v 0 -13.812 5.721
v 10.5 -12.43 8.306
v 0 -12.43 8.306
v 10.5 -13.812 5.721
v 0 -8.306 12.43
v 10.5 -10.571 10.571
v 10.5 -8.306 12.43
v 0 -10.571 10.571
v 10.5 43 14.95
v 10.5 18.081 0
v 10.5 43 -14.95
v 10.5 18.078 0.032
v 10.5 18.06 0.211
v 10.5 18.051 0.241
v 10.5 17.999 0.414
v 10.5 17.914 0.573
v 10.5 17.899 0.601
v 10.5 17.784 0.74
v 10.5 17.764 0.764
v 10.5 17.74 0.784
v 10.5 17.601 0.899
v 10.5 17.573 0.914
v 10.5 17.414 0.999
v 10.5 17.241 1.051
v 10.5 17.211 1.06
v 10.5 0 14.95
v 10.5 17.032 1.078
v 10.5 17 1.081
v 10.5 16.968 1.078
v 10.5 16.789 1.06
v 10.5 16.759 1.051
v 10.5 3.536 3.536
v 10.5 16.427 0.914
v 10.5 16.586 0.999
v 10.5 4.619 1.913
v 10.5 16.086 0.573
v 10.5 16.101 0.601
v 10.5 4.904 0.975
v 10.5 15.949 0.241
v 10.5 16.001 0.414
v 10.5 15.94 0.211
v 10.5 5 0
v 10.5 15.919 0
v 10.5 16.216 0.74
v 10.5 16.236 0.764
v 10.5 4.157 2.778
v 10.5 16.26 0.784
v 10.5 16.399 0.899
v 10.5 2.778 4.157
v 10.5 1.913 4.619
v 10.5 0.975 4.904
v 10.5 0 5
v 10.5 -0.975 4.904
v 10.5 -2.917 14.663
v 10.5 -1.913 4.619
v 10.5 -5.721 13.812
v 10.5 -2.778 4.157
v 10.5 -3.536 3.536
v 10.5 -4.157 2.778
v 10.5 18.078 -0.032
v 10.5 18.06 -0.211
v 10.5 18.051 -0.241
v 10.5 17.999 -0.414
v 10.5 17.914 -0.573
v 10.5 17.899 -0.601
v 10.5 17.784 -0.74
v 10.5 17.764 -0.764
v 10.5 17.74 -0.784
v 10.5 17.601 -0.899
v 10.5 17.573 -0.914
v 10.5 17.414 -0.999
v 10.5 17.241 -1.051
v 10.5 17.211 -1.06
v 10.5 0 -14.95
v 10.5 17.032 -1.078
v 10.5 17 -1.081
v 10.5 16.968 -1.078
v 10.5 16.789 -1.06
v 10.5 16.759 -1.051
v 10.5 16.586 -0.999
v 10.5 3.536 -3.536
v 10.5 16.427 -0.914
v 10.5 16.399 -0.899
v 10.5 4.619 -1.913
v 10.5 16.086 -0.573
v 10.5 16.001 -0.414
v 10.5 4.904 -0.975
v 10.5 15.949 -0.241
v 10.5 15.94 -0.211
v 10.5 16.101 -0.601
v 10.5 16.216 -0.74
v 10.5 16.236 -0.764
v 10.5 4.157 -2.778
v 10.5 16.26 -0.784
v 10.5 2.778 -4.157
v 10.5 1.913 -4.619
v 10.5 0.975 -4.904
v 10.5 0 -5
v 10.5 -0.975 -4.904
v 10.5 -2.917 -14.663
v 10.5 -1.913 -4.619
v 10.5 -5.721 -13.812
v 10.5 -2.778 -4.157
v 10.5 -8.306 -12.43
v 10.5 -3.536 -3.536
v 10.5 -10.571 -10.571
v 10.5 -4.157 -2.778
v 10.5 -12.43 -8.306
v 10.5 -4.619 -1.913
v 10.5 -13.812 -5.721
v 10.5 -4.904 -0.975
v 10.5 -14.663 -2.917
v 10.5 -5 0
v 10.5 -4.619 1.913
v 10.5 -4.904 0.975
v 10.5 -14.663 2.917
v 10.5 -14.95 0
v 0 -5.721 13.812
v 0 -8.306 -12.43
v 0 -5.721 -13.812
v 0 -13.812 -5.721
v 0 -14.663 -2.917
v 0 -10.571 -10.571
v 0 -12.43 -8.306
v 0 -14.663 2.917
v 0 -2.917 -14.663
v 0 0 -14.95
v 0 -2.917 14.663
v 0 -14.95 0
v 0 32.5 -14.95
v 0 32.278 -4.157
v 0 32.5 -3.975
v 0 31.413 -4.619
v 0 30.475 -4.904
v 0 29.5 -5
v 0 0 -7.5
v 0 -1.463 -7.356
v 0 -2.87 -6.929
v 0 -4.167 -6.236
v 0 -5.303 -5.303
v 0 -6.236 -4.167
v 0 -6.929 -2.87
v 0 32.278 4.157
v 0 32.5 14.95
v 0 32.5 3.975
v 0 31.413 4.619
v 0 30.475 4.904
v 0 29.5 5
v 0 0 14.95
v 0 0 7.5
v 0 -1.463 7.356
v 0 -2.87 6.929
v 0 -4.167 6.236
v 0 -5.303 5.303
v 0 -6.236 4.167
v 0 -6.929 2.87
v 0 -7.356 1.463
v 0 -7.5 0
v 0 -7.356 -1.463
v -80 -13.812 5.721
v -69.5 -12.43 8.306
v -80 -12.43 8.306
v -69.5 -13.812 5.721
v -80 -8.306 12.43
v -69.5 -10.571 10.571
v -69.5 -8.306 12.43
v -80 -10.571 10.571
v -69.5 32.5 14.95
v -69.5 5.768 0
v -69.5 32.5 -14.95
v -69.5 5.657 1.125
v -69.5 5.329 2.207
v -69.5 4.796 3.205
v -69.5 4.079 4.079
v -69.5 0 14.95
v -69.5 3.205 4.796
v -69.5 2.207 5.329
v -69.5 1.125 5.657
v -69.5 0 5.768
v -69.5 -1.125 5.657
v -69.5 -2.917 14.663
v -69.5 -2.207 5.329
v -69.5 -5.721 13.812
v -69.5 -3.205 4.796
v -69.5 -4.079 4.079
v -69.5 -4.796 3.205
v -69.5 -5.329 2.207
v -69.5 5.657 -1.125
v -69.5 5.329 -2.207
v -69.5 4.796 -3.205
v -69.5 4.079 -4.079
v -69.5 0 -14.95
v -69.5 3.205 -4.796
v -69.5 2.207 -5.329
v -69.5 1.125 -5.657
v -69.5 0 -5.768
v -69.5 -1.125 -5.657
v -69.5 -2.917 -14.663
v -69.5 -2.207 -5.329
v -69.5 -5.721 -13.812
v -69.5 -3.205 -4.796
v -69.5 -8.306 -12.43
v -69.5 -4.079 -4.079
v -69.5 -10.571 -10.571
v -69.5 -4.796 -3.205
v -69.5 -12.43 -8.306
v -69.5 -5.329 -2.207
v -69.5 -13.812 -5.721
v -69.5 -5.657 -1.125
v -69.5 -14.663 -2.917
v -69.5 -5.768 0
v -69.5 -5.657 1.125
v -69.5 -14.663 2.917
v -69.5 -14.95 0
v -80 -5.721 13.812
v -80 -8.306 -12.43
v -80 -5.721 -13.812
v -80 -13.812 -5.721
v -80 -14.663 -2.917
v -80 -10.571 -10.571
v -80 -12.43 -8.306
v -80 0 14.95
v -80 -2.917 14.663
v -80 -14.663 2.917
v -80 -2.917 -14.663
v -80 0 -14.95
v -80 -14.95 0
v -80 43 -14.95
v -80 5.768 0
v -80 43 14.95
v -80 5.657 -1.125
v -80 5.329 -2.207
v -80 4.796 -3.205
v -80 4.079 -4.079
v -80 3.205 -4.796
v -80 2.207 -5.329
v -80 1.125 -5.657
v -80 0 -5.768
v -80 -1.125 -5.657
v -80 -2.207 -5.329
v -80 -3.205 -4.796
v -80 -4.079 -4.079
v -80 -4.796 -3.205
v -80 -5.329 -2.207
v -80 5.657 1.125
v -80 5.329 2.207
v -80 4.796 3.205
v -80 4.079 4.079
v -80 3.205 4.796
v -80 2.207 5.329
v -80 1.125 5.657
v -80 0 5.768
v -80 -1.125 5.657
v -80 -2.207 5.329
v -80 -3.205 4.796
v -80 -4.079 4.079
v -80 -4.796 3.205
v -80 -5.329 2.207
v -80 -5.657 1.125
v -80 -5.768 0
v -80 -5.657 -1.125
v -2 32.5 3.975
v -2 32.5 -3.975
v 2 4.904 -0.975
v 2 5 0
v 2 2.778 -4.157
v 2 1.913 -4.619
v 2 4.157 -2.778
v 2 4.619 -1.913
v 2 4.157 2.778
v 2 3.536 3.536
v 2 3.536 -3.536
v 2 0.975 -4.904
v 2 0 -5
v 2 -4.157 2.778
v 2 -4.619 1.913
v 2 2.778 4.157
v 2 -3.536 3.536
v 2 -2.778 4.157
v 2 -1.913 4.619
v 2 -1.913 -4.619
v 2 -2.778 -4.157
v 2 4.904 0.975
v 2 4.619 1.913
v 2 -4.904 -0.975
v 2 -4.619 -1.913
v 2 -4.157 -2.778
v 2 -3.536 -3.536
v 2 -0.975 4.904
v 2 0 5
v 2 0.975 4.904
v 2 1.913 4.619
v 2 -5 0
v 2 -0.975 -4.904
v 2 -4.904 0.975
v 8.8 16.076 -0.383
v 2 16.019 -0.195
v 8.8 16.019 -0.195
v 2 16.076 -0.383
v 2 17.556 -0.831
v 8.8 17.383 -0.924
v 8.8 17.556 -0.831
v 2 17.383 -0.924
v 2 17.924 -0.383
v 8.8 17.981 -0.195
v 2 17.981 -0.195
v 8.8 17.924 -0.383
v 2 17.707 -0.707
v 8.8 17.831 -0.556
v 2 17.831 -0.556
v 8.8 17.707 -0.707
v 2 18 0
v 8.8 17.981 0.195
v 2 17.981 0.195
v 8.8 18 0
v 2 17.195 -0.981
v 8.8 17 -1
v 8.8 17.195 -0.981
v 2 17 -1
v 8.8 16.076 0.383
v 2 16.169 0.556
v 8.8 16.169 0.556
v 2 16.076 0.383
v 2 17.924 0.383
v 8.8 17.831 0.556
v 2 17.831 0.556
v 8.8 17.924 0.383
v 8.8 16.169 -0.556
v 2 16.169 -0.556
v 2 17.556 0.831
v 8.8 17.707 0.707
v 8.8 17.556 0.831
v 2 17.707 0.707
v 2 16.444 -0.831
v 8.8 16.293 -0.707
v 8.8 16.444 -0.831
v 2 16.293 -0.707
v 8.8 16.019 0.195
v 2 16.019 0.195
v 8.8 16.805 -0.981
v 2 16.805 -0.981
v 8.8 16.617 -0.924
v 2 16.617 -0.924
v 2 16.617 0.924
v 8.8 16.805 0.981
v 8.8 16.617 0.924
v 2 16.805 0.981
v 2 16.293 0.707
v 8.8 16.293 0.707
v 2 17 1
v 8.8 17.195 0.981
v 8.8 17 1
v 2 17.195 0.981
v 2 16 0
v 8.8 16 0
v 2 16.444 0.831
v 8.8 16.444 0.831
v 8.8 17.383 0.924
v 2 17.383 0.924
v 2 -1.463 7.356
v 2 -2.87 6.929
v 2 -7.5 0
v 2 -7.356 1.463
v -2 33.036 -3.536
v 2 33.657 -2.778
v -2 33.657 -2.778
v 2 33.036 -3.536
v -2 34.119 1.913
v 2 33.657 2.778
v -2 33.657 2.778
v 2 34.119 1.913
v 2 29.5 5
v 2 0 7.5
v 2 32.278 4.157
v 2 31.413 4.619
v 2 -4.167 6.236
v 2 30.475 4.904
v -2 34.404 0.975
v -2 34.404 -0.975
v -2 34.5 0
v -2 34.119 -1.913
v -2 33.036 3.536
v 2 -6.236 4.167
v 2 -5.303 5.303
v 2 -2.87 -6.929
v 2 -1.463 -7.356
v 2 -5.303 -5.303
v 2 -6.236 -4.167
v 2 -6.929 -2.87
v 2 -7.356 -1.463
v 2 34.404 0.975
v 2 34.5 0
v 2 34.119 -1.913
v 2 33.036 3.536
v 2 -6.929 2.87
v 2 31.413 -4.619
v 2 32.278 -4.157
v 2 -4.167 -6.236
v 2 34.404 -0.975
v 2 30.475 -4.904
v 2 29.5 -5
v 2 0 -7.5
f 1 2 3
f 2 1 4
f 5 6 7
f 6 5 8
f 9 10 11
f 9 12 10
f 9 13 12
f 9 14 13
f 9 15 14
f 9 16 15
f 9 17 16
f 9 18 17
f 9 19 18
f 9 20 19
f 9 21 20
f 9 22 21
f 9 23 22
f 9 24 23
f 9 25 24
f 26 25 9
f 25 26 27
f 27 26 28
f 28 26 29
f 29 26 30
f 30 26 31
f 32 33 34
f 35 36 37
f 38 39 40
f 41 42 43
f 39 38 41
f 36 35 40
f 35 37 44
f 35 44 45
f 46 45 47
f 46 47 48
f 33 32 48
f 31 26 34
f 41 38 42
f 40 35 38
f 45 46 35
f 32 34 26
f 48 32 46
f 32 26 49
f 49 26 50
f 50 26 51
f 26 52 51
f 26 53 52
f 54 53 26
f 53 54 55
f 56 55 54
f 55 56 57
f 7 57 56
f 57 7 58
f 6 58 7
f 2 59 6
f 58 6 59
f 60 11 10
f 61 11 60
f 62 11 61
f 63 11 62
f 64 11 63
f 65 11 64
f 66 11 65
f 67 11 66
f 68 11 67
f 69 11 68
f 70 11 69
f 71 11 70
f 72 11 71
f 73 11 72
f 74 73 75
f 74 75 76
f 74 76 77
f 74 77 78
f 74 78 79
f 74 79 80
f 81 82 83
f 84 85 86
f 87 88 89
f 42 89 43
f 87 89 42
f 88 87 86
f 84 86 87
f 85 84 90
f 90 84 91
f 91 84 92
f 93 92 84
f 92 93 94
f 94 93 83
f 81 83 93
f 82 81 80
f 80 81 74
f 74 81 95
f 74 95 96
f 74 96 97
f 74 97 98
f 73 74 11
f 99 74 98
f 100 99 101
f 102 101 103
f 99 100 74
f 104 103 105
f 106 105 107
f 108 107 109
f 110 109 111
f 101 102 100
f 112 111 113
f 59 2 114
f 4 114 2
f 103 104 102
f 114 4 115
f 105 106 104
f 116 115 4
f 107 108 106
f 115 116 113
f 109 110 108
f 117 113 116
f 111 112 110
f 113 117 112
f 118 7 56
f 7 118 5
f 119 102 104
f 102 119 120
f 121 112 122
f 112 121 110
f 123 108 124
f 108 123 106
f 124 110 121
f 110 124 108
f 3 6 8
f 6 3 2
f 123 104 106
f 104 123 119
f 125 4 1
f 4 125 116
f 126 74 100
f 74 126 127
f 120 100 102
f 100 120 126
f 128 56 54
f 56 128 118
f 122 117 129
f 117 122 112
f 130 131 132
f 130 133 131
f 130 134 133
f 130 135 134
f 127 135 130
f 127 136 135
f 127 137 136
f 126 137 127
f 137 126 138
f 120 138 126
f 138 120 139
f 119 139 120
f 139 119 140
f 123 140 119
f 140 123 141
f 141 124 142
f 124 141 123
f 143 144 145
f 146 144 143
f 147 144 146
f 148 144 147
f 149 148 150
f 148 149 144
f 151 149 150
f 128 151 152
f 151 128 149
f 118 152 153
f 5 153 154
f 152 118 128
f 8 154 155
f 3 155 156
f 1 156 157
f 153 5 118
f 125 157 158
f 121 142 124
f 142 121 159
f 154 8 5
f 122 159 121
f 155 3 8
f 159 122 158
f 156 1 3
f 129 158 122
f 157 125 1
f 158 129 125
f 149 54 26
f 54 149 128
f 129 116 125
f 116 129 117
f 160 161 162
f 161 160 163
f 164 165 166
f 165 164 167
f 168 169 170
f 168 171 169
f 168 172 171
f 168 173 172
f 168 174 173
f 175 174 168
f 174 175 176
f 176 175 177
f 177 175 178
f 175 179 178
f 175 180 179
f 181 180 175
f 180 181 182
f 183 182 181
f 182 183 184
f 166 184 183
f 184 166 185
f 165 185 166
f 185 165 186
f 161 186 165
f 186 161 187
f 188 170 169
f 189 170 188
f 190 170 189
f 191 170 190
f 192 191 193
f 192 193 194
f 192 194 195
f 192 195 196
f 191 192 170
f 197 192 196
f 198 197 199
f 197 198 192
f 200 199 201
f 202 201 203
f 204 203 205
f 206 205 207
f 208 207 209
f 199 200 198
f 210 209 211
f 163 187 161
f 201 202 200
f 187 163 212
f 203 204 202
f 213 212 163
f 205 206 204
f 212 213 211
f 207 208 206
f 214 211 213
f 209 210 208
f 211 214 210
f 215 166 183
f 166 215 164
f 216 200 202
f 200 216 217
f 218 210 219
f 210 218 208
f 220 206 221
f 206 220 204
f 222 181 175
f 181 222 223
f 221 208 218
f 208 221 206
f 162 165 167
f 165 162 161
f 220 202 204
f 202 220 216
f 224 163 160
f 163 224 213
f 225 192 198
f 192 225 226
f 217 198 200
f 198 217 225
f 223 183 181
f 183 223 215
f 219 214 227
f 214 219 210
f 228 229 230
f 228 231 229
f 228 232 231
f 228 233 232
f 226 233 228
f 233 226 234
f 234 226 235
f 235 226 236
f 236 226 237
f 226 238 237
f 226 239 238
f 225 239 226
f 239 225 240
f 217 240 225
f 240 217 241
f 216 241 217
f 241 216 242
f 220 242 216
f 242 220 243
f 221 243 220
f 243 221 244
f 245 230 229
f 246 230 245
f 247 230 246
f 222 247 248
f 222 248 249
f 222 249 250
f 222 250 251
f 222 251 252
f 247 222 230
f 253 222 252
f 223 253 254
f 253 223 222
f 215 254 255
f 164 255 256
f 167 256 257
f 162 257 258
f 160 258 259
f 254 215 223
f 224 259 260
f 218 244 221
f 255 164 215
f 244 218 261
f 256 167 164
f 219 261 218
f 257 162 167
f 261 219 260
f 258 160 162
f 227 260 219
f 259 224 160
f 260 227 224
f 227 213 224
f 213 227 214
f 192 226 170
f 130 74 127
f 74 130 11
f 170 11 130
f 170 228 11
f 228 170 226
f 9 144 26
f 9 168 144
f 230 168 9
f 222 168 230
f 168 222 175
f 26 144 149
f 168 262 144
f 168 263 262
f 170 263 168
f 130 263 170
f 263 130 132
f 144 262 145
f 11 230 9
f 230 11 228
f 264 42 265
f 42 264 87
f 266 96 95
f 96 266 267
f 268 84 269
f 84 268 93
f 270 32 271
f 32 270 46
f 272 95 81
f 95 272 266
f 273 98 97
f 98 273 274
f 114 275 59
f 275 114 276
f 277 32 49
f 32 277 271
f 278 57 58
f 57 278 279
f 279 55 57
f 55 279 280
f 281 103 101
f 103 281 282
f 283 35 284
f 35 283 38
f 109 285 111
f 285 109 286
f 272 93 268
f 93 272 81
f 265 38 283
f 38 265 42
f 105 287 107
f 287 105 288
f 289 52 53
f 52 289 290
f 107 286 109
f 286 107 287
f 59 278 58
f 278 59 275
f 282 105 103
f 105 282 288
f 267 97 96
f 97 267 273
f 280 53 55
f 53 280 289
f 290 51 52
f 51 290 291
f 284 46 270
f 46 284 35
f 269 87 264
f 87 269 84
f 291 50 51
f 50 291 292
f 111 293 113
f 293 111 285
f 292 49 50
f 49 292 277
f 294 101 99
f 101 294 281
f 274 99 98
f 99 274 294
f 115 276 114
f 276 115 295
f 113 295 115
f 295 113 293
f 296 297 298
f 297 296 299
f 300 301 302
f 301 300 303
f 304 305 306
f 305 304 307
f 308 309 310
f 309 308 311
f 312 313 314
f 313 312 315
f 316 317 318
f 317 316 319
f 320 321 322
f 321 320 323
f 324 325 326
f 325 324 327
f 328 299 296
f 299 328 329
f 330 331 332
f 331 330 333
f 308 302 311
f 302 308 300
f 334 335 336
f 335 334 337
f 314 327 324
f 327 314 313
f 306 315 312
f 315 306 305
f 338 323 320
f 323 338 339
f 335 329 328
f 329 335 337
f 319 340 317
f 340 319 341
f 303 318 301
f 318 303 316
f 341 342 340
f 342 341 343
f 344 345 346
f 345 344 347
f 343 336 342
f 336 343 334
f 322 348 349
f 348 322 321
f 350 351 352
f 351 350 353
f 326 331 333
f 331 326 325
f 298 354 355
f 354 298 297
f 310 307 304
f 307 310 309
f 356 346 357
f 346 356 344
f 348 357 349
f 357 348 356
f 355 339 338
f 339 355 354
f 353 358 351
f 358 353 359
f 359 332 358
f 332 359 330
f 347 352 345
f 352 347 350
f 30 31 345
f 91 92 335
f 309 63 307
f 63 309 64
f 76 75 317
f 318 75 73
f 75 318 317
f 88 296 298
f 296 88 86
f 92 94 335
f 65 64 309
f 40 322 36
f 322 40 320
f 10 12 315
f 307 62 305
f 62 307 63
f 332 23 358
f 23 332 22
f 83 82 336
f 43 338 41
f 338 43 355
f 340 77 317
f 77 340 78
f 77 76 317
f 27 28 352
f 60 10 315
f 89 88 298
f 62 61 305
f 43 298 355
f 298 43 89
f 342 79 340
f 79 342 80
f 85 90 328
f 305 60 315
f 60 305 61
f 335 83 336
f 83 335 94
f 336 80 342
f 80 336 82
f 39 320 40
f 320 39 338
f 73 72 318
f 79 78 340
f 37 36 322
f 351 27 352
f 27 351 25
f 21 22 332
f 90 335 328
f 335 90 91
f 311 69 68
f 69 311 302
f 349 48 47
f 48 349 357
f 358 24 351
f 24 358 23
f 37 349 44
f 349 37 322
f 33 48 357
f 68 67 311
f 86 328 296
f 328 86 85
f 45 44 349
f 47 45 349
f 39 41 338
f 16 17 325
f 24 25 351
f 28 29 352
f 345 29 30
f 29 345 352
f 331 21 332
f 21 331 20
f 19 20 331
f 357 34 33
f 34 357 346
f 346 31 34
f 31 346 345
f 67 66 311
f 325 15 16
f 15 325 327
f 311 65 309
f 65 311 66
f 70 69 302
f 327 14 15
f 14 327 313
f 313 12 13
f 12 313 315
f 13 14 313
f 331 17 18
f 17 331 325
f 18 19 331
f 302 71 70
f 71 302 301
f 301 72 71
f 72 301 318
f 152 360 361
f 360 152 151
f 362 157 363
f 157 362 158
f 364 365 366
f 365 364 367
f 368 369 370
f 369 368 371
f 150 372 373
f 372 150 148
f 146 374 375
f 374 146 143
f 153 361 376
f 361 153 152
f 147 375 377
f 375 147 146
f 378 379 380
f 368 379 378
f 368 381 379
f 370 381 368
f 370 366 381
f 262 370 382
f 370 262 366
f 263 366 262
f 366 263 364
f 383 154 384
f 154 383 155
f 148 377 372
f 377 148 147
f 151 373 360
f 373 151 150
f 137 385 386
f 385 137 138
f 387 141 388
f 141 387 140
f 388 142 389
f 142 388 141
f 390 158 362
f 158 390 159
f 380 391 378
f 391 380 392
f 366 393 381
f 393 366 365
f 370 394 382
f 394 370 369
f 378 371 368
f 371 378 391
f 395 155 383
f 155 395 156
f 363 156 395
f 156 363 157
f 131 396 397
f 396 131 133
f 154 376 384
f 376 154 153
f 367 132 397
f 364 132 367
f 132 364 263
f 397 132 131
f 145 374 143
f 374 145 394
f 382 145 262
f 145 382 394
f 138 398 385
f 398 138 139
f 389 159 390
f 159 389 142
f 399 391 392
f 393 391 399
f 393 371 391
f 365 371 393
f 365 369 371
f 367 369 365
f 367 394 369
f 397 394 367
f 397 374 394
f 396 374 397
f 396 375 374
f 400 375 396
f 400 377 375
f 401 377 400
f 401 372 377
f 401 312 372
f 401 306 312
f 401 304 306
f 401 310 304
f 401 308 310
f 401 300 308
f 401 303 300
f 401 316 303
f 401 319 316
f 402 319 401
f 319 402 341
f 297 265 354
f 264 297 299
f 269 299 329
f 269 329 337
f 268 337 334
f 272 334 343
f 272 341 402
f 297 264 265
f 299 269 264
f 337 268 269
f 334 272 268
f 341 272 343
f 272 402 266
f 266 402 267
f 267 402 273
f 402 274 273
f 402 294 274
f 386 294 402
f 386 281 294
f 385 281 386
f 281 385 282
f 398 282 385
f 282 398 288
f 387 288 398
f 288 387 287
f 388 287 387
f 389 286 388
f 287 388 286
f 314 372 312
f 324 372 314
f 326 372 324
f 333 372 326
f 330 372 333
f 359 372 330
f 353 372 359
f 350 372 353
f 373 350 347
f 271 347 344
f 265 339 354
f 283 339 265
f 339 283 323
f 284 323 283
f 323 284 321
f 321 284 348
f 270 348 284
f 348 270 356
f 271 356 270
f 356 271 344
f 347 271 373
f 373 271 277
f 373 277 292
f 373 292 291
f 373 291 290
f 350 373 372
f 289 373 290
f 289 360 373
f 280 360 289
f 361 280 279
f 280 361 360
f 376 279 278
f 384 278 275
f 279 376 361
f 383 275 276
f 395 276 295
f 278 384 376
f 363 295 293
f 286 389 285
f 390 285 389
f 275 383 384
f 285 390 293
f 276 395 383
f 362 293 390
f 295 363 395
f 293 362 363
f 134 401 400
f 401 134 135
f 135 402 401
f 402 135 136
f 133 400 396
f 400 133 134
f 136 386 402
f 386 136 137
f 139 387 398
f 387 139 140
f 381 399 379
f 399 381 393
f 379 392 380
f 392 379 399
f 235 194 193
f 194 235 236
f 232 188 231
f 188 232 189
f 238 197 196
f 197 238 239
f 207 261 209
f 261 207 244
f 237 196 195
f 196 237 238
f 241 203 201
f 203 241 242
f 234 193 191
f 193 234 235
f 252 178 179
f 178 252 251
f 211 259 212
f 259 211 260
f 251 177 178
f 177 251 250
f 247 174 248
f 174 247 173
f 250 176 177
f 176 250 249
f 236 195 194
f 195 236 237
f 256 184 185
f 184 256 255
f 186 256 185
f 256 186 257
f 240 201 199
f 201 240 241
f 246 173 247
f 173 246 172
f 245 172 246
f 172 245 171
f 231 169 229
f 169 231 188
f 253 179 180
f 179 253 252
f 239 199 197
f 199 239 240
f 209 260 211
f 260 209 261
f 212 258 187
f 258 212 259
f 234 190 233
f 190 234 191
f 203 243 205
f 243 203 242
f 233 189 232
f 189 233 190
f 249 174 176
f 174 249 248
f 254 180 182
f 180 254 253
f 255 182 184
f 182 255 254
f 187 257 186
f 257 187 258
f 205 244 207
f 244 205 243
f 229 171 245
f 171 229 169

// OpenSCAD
/* ------ s8330m ------ */
//servo dimensions
s8330m_width = 29; //D
s8330m_height = 39;
s8330m_length = 59;
s8330m_total_length = 74;
s8330m_total_height = 57;
s8330m_bottom_cylinder_diameter = 0.384*s8330m_width; //sleeve
//s8330m_bottom_cylinder_height = 4.8; //sleeve
s8830m_bottomhinge_hole = s8330m_bottom_cylinder_diameter+0.4;

//servo_fixation_holes
s8330m_fixation_hole_x = 5;
s8330m_fixation_hole_y = 0;
s8330m_fixation_hole_z = 8.25;
s8330m_hole_diameter = 2.5;

//horn
s8330m_horn_height = 4;
s8330m_horn_1stcircle = 10;
s8330m_horn_2ndcircle = 15;
s8330m_horn_length = 34.5;
s8330m_horn_bigscrew = 10;
s8330m_horn_smallscrew = 2;
s8330m_horn_smallscrew_length =17;
s8330m_horn_head_d1 = 2;
s8330m_horn_head_d2 = 4;
    
/* ----------------------------- */

/* ------ if base_servo == "s8330m" ------*/
//hinge
support_z_hinge = s8330m_width + 0.9;
support_width_hinge = (s8330m_total_length - s8330m_length)/2 + 3;
servo_axis_clear = (s8330m_horn_length -s8330m_horn_1stcircle/2 + 3);
servo_HTot = s8330m_total_height + 2; //A
bigscrew = s8330m_horn_bigscrew;
smallscrew = s8330m_horn_smallscrew;
smallscrew_length = s8330m_horn_smallscrew_length;
smallscrew_head_d1 = s8330m_horn_head_d1;
smallscrew_head_d2 = s8330m_horn_head_d2;
//sleeve
support_width_sleeve = (s8330m_total_length - s8330m_length)/2 + 3;
servo_L = s8330m_length + 0.9;
servo_H = s8330m_height + 0.5;
support_z_sleeve = s8330m_width + 0.9;
servo_bottom_cylinder_diameter = s8330m_bottom_cylinder_diameter;
//servo_fixation_holes
servo_fixation_hole_x = s8330m_fixation_hole_x ;
servo_fixation_hole_y = s8330m_fixation_hole_y ;
servo_fixation_hole_z = s8330m_fixation_hole_z ;
servo_hole_diameter = 2;

/* ----------------------------- */
sleeve_hinge_dist = (support_width_hinge+support_width_sleeve);
sleeve_hinge_size = sleeve_hinge_dist*2;
hinge_sleeve_dist = 5;
hanger_height = support_width_hinge + 0.3;

module servo_sleeve(type = "side_hole", hole = "one", base_servo = "s8330m"){
 
    union(){
	  difference(){
	    linear_extrude(height = support_z_sleeve, center = true)
	    polygon( points=[[0,0],
	                 [support_width_sleeve, 0],
	                 [support_width_sleeve, -(servo_H + support_width_sleeve)],
	                 [-servo_L - support_width_sleeve, -(servo_H + support_width_sleeve)],
	                 [-servo_L - support_width_sleeve, 0],
	                 [-servo_L, 0],
	                 [-servo_L, -servo_H],
	                 [0, -servo_H]
	                ]);
	    // Servo fixation hole
	    translate([servo_fixation_hole_x, servo_fixation_hole_y, servo_fixation_hole_z])
	    rotate([90, 0, 0])
	    cylinder(d = servo_hole_diameter, h = 15, $fn = 32);
	
	    // Servo fixation hole
	    translate([-servo_L - servo_fixation_hole_x, servo_fixation_hole_y, servo_fixation_hole_z])
	    rotate([90, 0, 0])
	    cylinder(d = servo_hole_diameter, h = 15, $fn = 32);
        if(hole == "two")
        {
            // Servo fixation hole
	    translate([servo_fixation_hole_x, servo_fixation_hole_y, -servo_fixation_hole_z])
	    rotate([90, 0, 0])
	    cylinder(d = servo_hole_diameter, h = 15, $fn = 32);
	
	    // Servo fixation hole
	    translate([-servo_L - servo_fixation_hole_x, servo_fixation_hole_y, -servo_fixation_hole_z])
	    rotate([90, 0, 0])
	    cylinder(d = servo_hole_diameter, h = 15, $fn = 32);
        }
        
        // Servo cable carving (side start)
	    translate([-servo_L - 1.4, -servo_H - 1.4 + 1e-3, -4.2/2])
	    #cube([support_width_sleeve, 7 + 1.4, 4.2]);
	
        if(type == "side_hole"){
  	      // Servo cable carving
	      translate([-servo_L, -1.4 - servo_H, -4.2/2])
	      cube([servo_L + support_width_sleeve, 1.5, 4.1]);
	
	      // Servo cable header hole
	      translate([-10, -1.0 - servo_H, -3.2/2])
	      cube([servo_L + support_width_sleeve, 9, 3.2]);
        } else { // bottom_hole
  	      // Servo cable carving
	      translate([-servo_L, -1.4 - servo_H, -4.2/2])
	      cube([servo_L, 1.5, 4.1]);
	
	      // Servo cable header hole
	      translate([-9, -1.5 * support_width_sleeve - servo_H, -3.2/2])
	      #cube([9, 2 * support_width_sleeve, 3.2]);
        }
	  }
	
	  // Servo hinge
	  translate([-servo_L + 4.5,  -(servo_H + support_width_sleeve), 0])
	  rotate([90, 0, 0])
	  #cylinder(d = servo_bottom_cylinder_diameter, h = support_width_hinge-1, $fn =32);
	
	}

}


module horn_single(horn = "sg90"){
    if(horn == "s8330m"){
        linear_extrude(height = s8330m_horn_height, center = false)
        hull(){
            translate([s8330m_horn_length -s8330m_horn_1stcircle/2, 0, 0]) circle(d = s8330m_horn_1stcircle, $fn = 32);
            circle(d = s8330m_horn_2ndcircle, $fn = 32);
        }
    }
    else if (horn == "mg946r"){
      linear_extrude(height = mg946r_horn_height, center = false)
      hull(){
       translate([mg946r_horn_length- mg946r_horn_1stcircle/2, 0, 0]) circle(d = mg946r_horn_1stcircle, $fn = 32);
       circle(d = mg946r_horn_2ndcircle, $fn = 32);
      }
    }
    else if (horn == "sg90"){
        linear_extrude(height = sg90_horn_height, center = false)
      hull(){
       translate([sg90_horn_length-sg90_horn_1stcircle/2, 0, 0]) circle(d = sg90_horn_1stcircle, $fn = 32);
       circle(d = sg90_horn_2ndcircle, $fn = 32);
      }
    }
}

module four_horn(horn = "s8330m"){
    for(i=[0:3])
    {
        rotate([0, 0, 90*i])
        horn_single(horn);
    }
}

module servo_hinge(hinge_servo = "s8330m"){

	difference(){
        union(){
            
          linear_extrude(height = support_z_hinge, center = true)
            polygon( points=[
	                 [support_width_hinge, 0],
	                 [0, 0],
	                 [0, servo_axis_clear],
	                 [-servo_HTot - support_width_sleeve, servo_axis_clear],
	                 [-servo_HTot - support_width_sleeve, 0],
	                 [-servo_HTot - support_width_sleeve - support_width_hinge, 0],
	                 [-servo_HTot - support_width_sleeve - support_width_hinge, support_width_hinge + servo_axis_clear],
	                 [support_width_hinge, support_width_hinge + servo_axis_clear]
	                ]);

          // Round end
          for(i = [0:1]){
              translate([i*(-servo_HTot - support_width_sleeve - support_width_hinge), 0, 0]) rotate([0, 90, 0])
                cylinder(d = support_z_hinge, h = support_width_hinge, $fn = 32);
          }
        
        }
        union(){
            // Horn Big screw
            translate([-support_width_hinge/2, 0, 0]) rotate([0, 90, 0])
            #cylinder(d = bigscrew, h = 2*support_width_hinge, $fn =32);

            // Horn Small screw
            translate([-support_width_hinge/2, smallscrew_length, 0])
            rotate([0, 90, 0]) 
                cylinder(d = smallscrew, h = 2*support_width_hinge, $fn =32);
        
            // Horn Small screw head
            translate([support_width_hinge - 1.7, smallscrew_length, 0])
            rotate([0, 90, 0]) 
                #cylinder(d1 = smallscrew_head_d1, d2 = smallscrew_head_d2, h = 2*support_width_hinge, $fn =32);
        

            // Horn
            translate([-2, 0, 0]) rotate([90, 0, 90]) 
                horn_single(hinge_servo);
	
            // Bottom hinge hole
            translate([-servo_HTot - 2.5*support_width_hinge, 0, 0])
            rotate([0, 90, 0])
                #cylinder(d = s8830m_bottomhinge_hole, h = 2*support_width_hinge, $fn =32);
	  }
	
	}

}


module servo_hinge_base(hinge_servo = "s8330m"){

	difference(){
        union(){
            
          linear_extrude(height = support_z_hinge, center = true)
            polygon( points=[
	                 [support_width_hinge, 0],
	                 [0, 0],
	                 [0, servo_axis_clear],
	                 [-servo_HTot - support_width_sleeve, servo_axis_clear],
	                 [-servo_HTot - support_width_sleeve, 0],
	                 [-servo_HTot - support_width_sleeve - support_width_hinge, 0],
	                 [-servo_HTot - support_width_sleeve - support_width_hinge, support_width_hinge + servo_axis_clear],
	                 [support_width_hinge, support_width_hinge + servo_axis_clear]
	                ]);

          // Round end
          for(i = [0:1]){
              translate([i*(-servo_HTot - support_width_sleeve - support_width_hinge), 0, 0]) rotate([0, 90, 0])
                cylinder(d = support_z_hinge, h = support_width_hinge, $fn = 32);
          }
        
        }
        union(){
            // Horn Big screw
            translate([-support_width_hinge/2, 0, 0]) rotate([0, 90, 0])
            #cylinder(d = bigscrew, h = 2*support_width_hinge, $fn =32);

            // Horn Small screw
            translate([-support_width_hinge/2, smallscrew_length, 0])
            rotate([0, 90, 0]) 
                cylinder(d = smallscrew, h = 2*support_width_hinge, $fn =32);
        
            // Horn Small screw head
            translate([support_width_hinge - 1.7, smallscrew_length, 0])
            rotate([0, 90, 0]) 
                #cylinder(d1 = smallscrew_head_d1, d2 = smallscrew_head_d2, h = 2*support_width_hinge, $fn =32);
        

            // Horn
            translate([-2, 0, 0]) rotate([90, 0, 90]) 
                horn_single(hinge_servo);
	
            // Bottom hinge hole
            translate([-servo_HTot - 2.5*support_width_hinge, 0, 0])
            rotate([0, 90, 0])
                #cylinder(d = s8830m_bottomhinge_hole, h = 2*support_width_hinge, $fn =32);
                
                translate([support_width_hinge,-servo_axis_clear+support_z_hinge/2+3.5,0]) rotate([0,90,0]) 
            hanger_base();
	  }
	
	}

}

module sleeve_hinge(horn, screw){
  difference(){
      union(){
         translate([-sleeve_hinge_size/2 + support_width_sleeve, -sleeve_hinge_dist/2 - servo_H - support_width_sleeve, 0])
  #cube([sleeve_hinge_size, sleeve_hinge_dist + 2, support_z_sleeve], center = true);

  translate([0, -servo_axis_clear - servo_H - 2 * support_width_hinge - sleeve_hinge_dist, 0])
  servo_hinge(horn);
    
  if(screw == "one") servo_sleeve(type = "side_hole", hole = "one");
      else servo_sleeve(type = "side_hole", hole = "two");
     }
       /*   
      // 1st screw
      
	    translate([-(sleeve_hinge_size - max(support_width_sleeve, support_width_hinge))/3, -servo_axis_clear - servo_H - 2 * support_width_hinge - 2*sleeve_hinge_dist, 0])
	    rotate([0, 90, 90]) 
	    #cylinder(d = 2.5, h = 100, $fn =32);
      // 2nd screw
	    translate([-(sleeve_hinge_size - max(support_width_sleeve, support_width_hinge))*2/3, -servo_axis_clear - servo_H - 2 * support_width_hinge - 2*sleeve_hinge_dist, 0])
	    rotate([0, 90, 90]) 
	    #cylinder(d = 2.5, h = 100, $fn =32);*/
  }
  
}


module hinge_sleeve_alt_hinge(horn, screw){
  difference(){
    union(){
      translate([-17.1*abs(servo_axis_clear-servo_H), -servo_L - 2 * support_width_sleeve - hinge_sleeve_dist, 0]) rotate([0, 0, 90]) servo_hinge(horn);  
    }

    for (i = [0:1]){
    translate([-17.1*abs(servo_axis_clear-servo_H)-5/16.5*servo_H, -servo_L - (i+0.5) * support_width_sleeve - hinge_sleeve_dist, 0])
    #cylinder(d = 2/5*support_width_sleeve, h = 30, center = true, $fn =32);

    translate([-17.1*abs(servo_axis_clear-servo_H)-16/16.5*servo_H, -servo_L - (i+0.5) * support_width_sleeve - hinge_sleeve_dist, 0])
    #cylinder(d = 2/5*support_width_sleeve, h = 30, center = true, $fn =32);
    }
  }
}


module hinge_sleeve_alt_sleeve(horn, screw){
  difference(){
    union(){
  
      translate([-15.5*abs(servo_axis_clear-servo_H), -servo_L, 0])
      rotate([0, 0, -90])
      if(screw == "one") servo_sleeve(type = "bottom", hole = "one");
      else servo_sleeve(type = "bottom_hole", hole = "two");
    }
    
    translate([-17.1*abs(servo_axis_clear-servo_H)-5/16.5*servo_H, -servo_L - 1.5 * support_width_sleeve - hinge_sleeve_dist, 0])
    #cylinder(d = 2.5, h = 30, center = true, $fn =32);

    translate([-17.1*abs(servo_axis_clear-servo_H)-16/16.5*servo_H, -servo_L - 1.5 * support_width_sleeve - hinge_sleeve_dist, 0])
    #cylinder(d = 2.5, h = 30, center = true, $fn =32);

    translate([-17.1*abs(servo_axis_clear-servo_H)-5/16.5*servo_H, -servo_L - 0.5 * support_width_sleeve, 0])
    #cylinder(d = 2.5, h = 30, center = true, $fn =32);

    translate([-17.1*abs(servo_axis_clear-servo_H)-16/16.5*servo_H, -servo_L - 0.5 * support_width_sleeve, 0])
    #cylinder(d = 2.5, h = 30, center = true, $fn =32);
  }
}
/*------------------------- Base -------------------------*/
module poly_base(base_servo){
    
    
    
BasePoints = [
  [  -support_z_hinge/2,  -support_z_hinge/2,  0 ],  //0
  [ support_z_hinge/2,  -support_z_hinge/2,  0 ],  //1
  [ support_z_hinge/2,  servo_axis_clear + support_width_hinge,  0 ],  //2
  [  -support_z_hinge/2,  servo_axis_clear + support_width_hinge,  0 ],  //3
  [  -support_z_hinge,  -support_z_hinge/2-support_width_hinge,  support_width_hinge ],  //4
  [ support_z_hinge,  -support_z_hinge/2-support_width_hinge,  support_width_hinge ],  //5
  [ support_z_hinge,  servo_axis_clear + 2*support_width_hinge,  support_width_hinge ],  //6
  [  -support_z_hinge,  servo_axis_clear + 2*support_width_hinge,  support_width_hinge ]]; //7
  
BaseFaces = [
  [0,1,2,3],  // bottom
  [4,5,1,0],  // front
  [7,6,5,4],  // top
  [5,6,2,1],  // right
  [6,7,3,2],  // back
  [7,4,0,3]]; // left
  
    difference(){
        union(){
            scale(v=[2,2,2]) polyhedron( BasePoints, BaseFaces );
    
            translate([0,0,2*support_width_hinge])
                linear_extrude(height = support_width_hinge/2, center = true)
                    scale(v=[2,2,2]) polygon(points = [ 
            [-support_z_hinge-10, -10-support_z_hinge/2-support_width_hinge],
            [support_z_hinge+10,  -support_z_hinge/2-support_width_hinge-10 ],
            [support_z_hinge+10,servo_axis_clear+10+ 2*support_width_hinge ],  
            [-support_z_hinge-10,servo_axis_clear+10+ 2*support_width_hinge]]);
        }
        
        //Support base screws
        for(i = [-1:2:1]){
            scale(v=[2,2,2])translate([i*support_z_hinge+i*5, -5-support_z_hinge/2-support_width_hinge, 0]) cylinder(d = 2.5, h = 15, $fn = 32);
            scale(v=[2,2,2])translate([i*support_z_hinge+i*5, servo_axis_clear+2*support_width_hinge+5, 0]) cylinder(d = 2.5, h = 15, $fn = 32);
        }
    }
}

module rect_base(){
    difference(){
        union(){
            linear_extrude(height = 5)
                polygon(points = [ 
                [-support_z_hinge/2-5,-support_z_hinge/2-5],
                [support_z_hinge/2+5, -support_z_hinge/2-5],
                [support_z_hinge/2+5,servo_axis_clear + support_width_hinge+5],
                [-support_z_hinge/2-5,servo_axis_clear+support_width_hinge+5]]);
        }
        
        //Support base screws
        for(i = [-1:2:1]){
            translate([i*support_z_hinge/2+i*2.5,-support_z_hinge/2-2.5, 0]) cylinder(d = 2.5, h = 15, $fn = 32);
            translate([i*support_z_hinge/2+i*2.5, servo_axis_clear+support_width_hinge+2.5, 0]) cylinder(d = 2.5, h = 15, $fn = 32);
        }
    }
}

module hanger_base(){
    difference(){
        union(){
            linear_extrude(height = 5)
                polygon(points = [ 
                [-support_z_hinge/2-5.15,-10],
                [support_z_hinge/2+5.15, -10],
                [support_z_hinge/2+5.15,servo_axis_clear+support_width_hinge+support_z_hinge/2],
                [-support_z_hinge/2-5.15,servo_axis_clear+support_width_hinge+support_z_hinge/2]]);
            
            
            /*translate([0,0,-hanger_height]) linear_extrude(height = hanger_height)
            polygon(points = [ 
                [-support_z_hinge/2-5.15,-10],
                [support_z_hinge/2+5.15, -10],
                [support_z_hinge/2+5.15,servo_axis_clear + support_width_hinge+support_z_hinge/2],
                [-support_z_hinge/2-5.15, servo_axis_clear+support_width_hinge+support_z_hinge/2]]);*/
            translate([0,0,-hanger_height-1]) linear_extrude(height = hanger_height+1)
            polygon(points = [ 
                [-support_z_hinge/2-5.15,-10],
                [support_z_hinge/2+5.15, -10],
                [support_z_hinge/2+5.15,servo_axis_clear + support_width_hinge+support_z_hinge/2],
                [-support_z_hinge/2-5.15, servo_axis_clear+support_width_hinge+support_z_hinge/2]]);
        }
        union(){
            //Support base screws
            for(i = [-1:1:1]){
                translate([i*support_z_hinge/2+i*2.25,-6.65, -hanger_height-1]) cylinder(d = 2.5, h = hanger_height+5+1, $fn = 32);
                translate([i*support_z_hinge/2+i*2.25, servo_axis_clear+support_width_hinge+support_z_hinge/2-3.35, -hanger_height-1]) cylinder(d = 2.5, h = hanger_height+5+1, $fn = 32);
                translate([i*support_z_hinge/2+i*2.25, (servo_axis_clear+support_width_hinge+support_z_hinge/2-10)/2, -hanger_height-1]) cylinder(d = 2.5, h = hanger_height+5+1, $fn = 32);
           }
           
           //hinge
            translate([0,0,-hanger_height]) linear_extrude(height = hanger_height)
        polygon(points = [ 
            [-support_z_hinge/2-0.15,-3.3],
            [support_z_hinge/2+0.15, -3.3],
            [support_z_hinge/2+0.15,servo_axis_clear + support_width_hinge+support_z_hinge/2],
            [-support_z_hinge/2-0.15, servo_axis_clear+support_width_hinge+support_z_hinge/2]]);
        
        translate([0,0,-hanger_height-1]) linear_extrude(height = hanger_height)
        polygon(points = [ 
            [-support_z_hinge/2-0.15+1,-3.3],
            [support_z_hinge/2+0.15-1, -3.3],
            [support_z_hinge/2+0.15-1,servo_axis_clear + support_width_hinge+support_z_hinge/2],
            [-support_z_hinge/2-0.15+1, servo_axis_clear+support_width_hinge+support_z_hinge/2]]);
        }
    }
}


module hanger_base_v2(){
    difference(){
        union(){
            linear_extrude(height = support_z_hinge/2 + servo_axis_clear+0.3)
                polygon(points = [ 
                [0,0],
                [support_width_hinge+0.3+1+5, 0],
                [support_width_hinge+0.3+1+5, support_z_hinge+0.3+10+2],
                [0, support_z_hinge+0.3+10+2],
                [0, support_z_hinge+0.3+5+1],
                [1, support_z_hinge+0.3+5+1],
                [1, support_z_hinge+0.3+5+2],
                [support_width_hinge+0.3+1, support_z_hinge+0.3+5+2],
                [support_width_hinge+0.3+1,5],
                [1,5],
                [1,5+1],
                [0,5+1] ]);
            translate([0,0,support_z_hinge/2 + servo_axis_clear+0.3]) cube([5+1+support_width_hinge+0.3,10+2+support_z_hinge+0.3,5],false);
        }
        union(){
            
        }
    }
}

module servo_base(base_servo, form_base, support_screws){ 
    
    difference(){
        union(){
            
            color("green") servo_hinge(base_servo);
             
            //visualization only //comment to export
            color("red") translate([servo_H - servo_HTot, -(servo_H + support_width_sleeve)-5.5,0])rotate([0,0,-90]) sleeve_hinge(base_servo, "two");
            
            //color("blue") translate([(17.1*abs(servo_axis_clear-servo_H)) - (servo_HTot + support_width_sleeve + support_width_hinge + servo_axis_clear + sleeve_hinge_dist), -(servo_L + 2 * support_width_sleeve + hinge_sleeve_dist), 0])  rotate([0,0,-90])hinge_sleeve_alt_sleeve ("s8330m", "two");
            
            if(form_base == "rect")
                translate([support_width_hinge,0,0]) rotate([0,90,0]) rect_base();
            else if(form_base == "poly")
                translate([support_width_hinge,0,0]) rotate([0,90,0]) poly_base(base_servo);
            else if(form_base == "hanger")
                translate([support_width_hinge,-servo_axis_clear+support_z_hinge/2-8,0]) rotate([0,90,0]) 
            hanger_base(base_servo);
            else if (form_base == "hanger2")
                translate([-1,servo_axis_clear,-support_z_hinge/2-5-1]) rotate([90,0,0])
            hanger_base_v2();
        }
        union(){
          
            // Support hinge Screws
            if(support_screws == "4")
                for(i = [1:1:2]){
                    translate([0, servo_axis_clear*i/3, support_z_hinge/3]) 
                    rotate([0, 90, 0]) cylinder(d = 2.5, h = 25, $fn =32);
                    translate([0, servo_axis_clear*i/3, -support_z_hinge/3]) 
                    rotate([0, 90, 0]) cylinder(d = 2.5, h = 25, $fn =32);
                }
            else if(support_screws == "2") {
            translate([0, servo_axis_clear/2, support_z_hinge/3]) 
                rotate([0, 90, 0]) cylinder(d = 2.5, h = 25, $fn =32);
            translate([0, servo_axis_clear/2, -support_z_hinge/3]) 
                rotate([0, 90, 0]) cylinder(d = 2.5, h = 25, $fn =32);
            }
            else if(support_screws == "3"){
                translate([0, servo_axis_clear/2, support_z_hinge/3]) 
                rotate([0, 90, 0]) cylinder(d = 2.5, h = 25, $fn =32);
                translate([0, servo_axis_clear/2, -support_z_hinge/3]) 
                rotate([0, 90, 0]) cylinder(d = 2.5, h = 25, $fn =32);
                translate([0, -support_z_hinge/3, 0]) rotate([0, 90, 0]) cylinder(d = 2.5, h = 25, $fn =32);    
            }
            else if(support_screws == "horizontal"){
                for(i = [1:1:2]){
                    translate([(hanger_height+5+1)/2, servo_axis_clear*(i*3-2)/5, -support_z_hinge/2-5.15]) 
                    cylinder(d = 2.5, h = support_z_hinge+15, $fn =32);
                }
            }
            
            
        }
    }
}

//hanger_base_v2();
//hanger_base();
//servo_hinge_base();
//servo_base("s8330m", "hanger2", "horizontal");



servo_hinge();
